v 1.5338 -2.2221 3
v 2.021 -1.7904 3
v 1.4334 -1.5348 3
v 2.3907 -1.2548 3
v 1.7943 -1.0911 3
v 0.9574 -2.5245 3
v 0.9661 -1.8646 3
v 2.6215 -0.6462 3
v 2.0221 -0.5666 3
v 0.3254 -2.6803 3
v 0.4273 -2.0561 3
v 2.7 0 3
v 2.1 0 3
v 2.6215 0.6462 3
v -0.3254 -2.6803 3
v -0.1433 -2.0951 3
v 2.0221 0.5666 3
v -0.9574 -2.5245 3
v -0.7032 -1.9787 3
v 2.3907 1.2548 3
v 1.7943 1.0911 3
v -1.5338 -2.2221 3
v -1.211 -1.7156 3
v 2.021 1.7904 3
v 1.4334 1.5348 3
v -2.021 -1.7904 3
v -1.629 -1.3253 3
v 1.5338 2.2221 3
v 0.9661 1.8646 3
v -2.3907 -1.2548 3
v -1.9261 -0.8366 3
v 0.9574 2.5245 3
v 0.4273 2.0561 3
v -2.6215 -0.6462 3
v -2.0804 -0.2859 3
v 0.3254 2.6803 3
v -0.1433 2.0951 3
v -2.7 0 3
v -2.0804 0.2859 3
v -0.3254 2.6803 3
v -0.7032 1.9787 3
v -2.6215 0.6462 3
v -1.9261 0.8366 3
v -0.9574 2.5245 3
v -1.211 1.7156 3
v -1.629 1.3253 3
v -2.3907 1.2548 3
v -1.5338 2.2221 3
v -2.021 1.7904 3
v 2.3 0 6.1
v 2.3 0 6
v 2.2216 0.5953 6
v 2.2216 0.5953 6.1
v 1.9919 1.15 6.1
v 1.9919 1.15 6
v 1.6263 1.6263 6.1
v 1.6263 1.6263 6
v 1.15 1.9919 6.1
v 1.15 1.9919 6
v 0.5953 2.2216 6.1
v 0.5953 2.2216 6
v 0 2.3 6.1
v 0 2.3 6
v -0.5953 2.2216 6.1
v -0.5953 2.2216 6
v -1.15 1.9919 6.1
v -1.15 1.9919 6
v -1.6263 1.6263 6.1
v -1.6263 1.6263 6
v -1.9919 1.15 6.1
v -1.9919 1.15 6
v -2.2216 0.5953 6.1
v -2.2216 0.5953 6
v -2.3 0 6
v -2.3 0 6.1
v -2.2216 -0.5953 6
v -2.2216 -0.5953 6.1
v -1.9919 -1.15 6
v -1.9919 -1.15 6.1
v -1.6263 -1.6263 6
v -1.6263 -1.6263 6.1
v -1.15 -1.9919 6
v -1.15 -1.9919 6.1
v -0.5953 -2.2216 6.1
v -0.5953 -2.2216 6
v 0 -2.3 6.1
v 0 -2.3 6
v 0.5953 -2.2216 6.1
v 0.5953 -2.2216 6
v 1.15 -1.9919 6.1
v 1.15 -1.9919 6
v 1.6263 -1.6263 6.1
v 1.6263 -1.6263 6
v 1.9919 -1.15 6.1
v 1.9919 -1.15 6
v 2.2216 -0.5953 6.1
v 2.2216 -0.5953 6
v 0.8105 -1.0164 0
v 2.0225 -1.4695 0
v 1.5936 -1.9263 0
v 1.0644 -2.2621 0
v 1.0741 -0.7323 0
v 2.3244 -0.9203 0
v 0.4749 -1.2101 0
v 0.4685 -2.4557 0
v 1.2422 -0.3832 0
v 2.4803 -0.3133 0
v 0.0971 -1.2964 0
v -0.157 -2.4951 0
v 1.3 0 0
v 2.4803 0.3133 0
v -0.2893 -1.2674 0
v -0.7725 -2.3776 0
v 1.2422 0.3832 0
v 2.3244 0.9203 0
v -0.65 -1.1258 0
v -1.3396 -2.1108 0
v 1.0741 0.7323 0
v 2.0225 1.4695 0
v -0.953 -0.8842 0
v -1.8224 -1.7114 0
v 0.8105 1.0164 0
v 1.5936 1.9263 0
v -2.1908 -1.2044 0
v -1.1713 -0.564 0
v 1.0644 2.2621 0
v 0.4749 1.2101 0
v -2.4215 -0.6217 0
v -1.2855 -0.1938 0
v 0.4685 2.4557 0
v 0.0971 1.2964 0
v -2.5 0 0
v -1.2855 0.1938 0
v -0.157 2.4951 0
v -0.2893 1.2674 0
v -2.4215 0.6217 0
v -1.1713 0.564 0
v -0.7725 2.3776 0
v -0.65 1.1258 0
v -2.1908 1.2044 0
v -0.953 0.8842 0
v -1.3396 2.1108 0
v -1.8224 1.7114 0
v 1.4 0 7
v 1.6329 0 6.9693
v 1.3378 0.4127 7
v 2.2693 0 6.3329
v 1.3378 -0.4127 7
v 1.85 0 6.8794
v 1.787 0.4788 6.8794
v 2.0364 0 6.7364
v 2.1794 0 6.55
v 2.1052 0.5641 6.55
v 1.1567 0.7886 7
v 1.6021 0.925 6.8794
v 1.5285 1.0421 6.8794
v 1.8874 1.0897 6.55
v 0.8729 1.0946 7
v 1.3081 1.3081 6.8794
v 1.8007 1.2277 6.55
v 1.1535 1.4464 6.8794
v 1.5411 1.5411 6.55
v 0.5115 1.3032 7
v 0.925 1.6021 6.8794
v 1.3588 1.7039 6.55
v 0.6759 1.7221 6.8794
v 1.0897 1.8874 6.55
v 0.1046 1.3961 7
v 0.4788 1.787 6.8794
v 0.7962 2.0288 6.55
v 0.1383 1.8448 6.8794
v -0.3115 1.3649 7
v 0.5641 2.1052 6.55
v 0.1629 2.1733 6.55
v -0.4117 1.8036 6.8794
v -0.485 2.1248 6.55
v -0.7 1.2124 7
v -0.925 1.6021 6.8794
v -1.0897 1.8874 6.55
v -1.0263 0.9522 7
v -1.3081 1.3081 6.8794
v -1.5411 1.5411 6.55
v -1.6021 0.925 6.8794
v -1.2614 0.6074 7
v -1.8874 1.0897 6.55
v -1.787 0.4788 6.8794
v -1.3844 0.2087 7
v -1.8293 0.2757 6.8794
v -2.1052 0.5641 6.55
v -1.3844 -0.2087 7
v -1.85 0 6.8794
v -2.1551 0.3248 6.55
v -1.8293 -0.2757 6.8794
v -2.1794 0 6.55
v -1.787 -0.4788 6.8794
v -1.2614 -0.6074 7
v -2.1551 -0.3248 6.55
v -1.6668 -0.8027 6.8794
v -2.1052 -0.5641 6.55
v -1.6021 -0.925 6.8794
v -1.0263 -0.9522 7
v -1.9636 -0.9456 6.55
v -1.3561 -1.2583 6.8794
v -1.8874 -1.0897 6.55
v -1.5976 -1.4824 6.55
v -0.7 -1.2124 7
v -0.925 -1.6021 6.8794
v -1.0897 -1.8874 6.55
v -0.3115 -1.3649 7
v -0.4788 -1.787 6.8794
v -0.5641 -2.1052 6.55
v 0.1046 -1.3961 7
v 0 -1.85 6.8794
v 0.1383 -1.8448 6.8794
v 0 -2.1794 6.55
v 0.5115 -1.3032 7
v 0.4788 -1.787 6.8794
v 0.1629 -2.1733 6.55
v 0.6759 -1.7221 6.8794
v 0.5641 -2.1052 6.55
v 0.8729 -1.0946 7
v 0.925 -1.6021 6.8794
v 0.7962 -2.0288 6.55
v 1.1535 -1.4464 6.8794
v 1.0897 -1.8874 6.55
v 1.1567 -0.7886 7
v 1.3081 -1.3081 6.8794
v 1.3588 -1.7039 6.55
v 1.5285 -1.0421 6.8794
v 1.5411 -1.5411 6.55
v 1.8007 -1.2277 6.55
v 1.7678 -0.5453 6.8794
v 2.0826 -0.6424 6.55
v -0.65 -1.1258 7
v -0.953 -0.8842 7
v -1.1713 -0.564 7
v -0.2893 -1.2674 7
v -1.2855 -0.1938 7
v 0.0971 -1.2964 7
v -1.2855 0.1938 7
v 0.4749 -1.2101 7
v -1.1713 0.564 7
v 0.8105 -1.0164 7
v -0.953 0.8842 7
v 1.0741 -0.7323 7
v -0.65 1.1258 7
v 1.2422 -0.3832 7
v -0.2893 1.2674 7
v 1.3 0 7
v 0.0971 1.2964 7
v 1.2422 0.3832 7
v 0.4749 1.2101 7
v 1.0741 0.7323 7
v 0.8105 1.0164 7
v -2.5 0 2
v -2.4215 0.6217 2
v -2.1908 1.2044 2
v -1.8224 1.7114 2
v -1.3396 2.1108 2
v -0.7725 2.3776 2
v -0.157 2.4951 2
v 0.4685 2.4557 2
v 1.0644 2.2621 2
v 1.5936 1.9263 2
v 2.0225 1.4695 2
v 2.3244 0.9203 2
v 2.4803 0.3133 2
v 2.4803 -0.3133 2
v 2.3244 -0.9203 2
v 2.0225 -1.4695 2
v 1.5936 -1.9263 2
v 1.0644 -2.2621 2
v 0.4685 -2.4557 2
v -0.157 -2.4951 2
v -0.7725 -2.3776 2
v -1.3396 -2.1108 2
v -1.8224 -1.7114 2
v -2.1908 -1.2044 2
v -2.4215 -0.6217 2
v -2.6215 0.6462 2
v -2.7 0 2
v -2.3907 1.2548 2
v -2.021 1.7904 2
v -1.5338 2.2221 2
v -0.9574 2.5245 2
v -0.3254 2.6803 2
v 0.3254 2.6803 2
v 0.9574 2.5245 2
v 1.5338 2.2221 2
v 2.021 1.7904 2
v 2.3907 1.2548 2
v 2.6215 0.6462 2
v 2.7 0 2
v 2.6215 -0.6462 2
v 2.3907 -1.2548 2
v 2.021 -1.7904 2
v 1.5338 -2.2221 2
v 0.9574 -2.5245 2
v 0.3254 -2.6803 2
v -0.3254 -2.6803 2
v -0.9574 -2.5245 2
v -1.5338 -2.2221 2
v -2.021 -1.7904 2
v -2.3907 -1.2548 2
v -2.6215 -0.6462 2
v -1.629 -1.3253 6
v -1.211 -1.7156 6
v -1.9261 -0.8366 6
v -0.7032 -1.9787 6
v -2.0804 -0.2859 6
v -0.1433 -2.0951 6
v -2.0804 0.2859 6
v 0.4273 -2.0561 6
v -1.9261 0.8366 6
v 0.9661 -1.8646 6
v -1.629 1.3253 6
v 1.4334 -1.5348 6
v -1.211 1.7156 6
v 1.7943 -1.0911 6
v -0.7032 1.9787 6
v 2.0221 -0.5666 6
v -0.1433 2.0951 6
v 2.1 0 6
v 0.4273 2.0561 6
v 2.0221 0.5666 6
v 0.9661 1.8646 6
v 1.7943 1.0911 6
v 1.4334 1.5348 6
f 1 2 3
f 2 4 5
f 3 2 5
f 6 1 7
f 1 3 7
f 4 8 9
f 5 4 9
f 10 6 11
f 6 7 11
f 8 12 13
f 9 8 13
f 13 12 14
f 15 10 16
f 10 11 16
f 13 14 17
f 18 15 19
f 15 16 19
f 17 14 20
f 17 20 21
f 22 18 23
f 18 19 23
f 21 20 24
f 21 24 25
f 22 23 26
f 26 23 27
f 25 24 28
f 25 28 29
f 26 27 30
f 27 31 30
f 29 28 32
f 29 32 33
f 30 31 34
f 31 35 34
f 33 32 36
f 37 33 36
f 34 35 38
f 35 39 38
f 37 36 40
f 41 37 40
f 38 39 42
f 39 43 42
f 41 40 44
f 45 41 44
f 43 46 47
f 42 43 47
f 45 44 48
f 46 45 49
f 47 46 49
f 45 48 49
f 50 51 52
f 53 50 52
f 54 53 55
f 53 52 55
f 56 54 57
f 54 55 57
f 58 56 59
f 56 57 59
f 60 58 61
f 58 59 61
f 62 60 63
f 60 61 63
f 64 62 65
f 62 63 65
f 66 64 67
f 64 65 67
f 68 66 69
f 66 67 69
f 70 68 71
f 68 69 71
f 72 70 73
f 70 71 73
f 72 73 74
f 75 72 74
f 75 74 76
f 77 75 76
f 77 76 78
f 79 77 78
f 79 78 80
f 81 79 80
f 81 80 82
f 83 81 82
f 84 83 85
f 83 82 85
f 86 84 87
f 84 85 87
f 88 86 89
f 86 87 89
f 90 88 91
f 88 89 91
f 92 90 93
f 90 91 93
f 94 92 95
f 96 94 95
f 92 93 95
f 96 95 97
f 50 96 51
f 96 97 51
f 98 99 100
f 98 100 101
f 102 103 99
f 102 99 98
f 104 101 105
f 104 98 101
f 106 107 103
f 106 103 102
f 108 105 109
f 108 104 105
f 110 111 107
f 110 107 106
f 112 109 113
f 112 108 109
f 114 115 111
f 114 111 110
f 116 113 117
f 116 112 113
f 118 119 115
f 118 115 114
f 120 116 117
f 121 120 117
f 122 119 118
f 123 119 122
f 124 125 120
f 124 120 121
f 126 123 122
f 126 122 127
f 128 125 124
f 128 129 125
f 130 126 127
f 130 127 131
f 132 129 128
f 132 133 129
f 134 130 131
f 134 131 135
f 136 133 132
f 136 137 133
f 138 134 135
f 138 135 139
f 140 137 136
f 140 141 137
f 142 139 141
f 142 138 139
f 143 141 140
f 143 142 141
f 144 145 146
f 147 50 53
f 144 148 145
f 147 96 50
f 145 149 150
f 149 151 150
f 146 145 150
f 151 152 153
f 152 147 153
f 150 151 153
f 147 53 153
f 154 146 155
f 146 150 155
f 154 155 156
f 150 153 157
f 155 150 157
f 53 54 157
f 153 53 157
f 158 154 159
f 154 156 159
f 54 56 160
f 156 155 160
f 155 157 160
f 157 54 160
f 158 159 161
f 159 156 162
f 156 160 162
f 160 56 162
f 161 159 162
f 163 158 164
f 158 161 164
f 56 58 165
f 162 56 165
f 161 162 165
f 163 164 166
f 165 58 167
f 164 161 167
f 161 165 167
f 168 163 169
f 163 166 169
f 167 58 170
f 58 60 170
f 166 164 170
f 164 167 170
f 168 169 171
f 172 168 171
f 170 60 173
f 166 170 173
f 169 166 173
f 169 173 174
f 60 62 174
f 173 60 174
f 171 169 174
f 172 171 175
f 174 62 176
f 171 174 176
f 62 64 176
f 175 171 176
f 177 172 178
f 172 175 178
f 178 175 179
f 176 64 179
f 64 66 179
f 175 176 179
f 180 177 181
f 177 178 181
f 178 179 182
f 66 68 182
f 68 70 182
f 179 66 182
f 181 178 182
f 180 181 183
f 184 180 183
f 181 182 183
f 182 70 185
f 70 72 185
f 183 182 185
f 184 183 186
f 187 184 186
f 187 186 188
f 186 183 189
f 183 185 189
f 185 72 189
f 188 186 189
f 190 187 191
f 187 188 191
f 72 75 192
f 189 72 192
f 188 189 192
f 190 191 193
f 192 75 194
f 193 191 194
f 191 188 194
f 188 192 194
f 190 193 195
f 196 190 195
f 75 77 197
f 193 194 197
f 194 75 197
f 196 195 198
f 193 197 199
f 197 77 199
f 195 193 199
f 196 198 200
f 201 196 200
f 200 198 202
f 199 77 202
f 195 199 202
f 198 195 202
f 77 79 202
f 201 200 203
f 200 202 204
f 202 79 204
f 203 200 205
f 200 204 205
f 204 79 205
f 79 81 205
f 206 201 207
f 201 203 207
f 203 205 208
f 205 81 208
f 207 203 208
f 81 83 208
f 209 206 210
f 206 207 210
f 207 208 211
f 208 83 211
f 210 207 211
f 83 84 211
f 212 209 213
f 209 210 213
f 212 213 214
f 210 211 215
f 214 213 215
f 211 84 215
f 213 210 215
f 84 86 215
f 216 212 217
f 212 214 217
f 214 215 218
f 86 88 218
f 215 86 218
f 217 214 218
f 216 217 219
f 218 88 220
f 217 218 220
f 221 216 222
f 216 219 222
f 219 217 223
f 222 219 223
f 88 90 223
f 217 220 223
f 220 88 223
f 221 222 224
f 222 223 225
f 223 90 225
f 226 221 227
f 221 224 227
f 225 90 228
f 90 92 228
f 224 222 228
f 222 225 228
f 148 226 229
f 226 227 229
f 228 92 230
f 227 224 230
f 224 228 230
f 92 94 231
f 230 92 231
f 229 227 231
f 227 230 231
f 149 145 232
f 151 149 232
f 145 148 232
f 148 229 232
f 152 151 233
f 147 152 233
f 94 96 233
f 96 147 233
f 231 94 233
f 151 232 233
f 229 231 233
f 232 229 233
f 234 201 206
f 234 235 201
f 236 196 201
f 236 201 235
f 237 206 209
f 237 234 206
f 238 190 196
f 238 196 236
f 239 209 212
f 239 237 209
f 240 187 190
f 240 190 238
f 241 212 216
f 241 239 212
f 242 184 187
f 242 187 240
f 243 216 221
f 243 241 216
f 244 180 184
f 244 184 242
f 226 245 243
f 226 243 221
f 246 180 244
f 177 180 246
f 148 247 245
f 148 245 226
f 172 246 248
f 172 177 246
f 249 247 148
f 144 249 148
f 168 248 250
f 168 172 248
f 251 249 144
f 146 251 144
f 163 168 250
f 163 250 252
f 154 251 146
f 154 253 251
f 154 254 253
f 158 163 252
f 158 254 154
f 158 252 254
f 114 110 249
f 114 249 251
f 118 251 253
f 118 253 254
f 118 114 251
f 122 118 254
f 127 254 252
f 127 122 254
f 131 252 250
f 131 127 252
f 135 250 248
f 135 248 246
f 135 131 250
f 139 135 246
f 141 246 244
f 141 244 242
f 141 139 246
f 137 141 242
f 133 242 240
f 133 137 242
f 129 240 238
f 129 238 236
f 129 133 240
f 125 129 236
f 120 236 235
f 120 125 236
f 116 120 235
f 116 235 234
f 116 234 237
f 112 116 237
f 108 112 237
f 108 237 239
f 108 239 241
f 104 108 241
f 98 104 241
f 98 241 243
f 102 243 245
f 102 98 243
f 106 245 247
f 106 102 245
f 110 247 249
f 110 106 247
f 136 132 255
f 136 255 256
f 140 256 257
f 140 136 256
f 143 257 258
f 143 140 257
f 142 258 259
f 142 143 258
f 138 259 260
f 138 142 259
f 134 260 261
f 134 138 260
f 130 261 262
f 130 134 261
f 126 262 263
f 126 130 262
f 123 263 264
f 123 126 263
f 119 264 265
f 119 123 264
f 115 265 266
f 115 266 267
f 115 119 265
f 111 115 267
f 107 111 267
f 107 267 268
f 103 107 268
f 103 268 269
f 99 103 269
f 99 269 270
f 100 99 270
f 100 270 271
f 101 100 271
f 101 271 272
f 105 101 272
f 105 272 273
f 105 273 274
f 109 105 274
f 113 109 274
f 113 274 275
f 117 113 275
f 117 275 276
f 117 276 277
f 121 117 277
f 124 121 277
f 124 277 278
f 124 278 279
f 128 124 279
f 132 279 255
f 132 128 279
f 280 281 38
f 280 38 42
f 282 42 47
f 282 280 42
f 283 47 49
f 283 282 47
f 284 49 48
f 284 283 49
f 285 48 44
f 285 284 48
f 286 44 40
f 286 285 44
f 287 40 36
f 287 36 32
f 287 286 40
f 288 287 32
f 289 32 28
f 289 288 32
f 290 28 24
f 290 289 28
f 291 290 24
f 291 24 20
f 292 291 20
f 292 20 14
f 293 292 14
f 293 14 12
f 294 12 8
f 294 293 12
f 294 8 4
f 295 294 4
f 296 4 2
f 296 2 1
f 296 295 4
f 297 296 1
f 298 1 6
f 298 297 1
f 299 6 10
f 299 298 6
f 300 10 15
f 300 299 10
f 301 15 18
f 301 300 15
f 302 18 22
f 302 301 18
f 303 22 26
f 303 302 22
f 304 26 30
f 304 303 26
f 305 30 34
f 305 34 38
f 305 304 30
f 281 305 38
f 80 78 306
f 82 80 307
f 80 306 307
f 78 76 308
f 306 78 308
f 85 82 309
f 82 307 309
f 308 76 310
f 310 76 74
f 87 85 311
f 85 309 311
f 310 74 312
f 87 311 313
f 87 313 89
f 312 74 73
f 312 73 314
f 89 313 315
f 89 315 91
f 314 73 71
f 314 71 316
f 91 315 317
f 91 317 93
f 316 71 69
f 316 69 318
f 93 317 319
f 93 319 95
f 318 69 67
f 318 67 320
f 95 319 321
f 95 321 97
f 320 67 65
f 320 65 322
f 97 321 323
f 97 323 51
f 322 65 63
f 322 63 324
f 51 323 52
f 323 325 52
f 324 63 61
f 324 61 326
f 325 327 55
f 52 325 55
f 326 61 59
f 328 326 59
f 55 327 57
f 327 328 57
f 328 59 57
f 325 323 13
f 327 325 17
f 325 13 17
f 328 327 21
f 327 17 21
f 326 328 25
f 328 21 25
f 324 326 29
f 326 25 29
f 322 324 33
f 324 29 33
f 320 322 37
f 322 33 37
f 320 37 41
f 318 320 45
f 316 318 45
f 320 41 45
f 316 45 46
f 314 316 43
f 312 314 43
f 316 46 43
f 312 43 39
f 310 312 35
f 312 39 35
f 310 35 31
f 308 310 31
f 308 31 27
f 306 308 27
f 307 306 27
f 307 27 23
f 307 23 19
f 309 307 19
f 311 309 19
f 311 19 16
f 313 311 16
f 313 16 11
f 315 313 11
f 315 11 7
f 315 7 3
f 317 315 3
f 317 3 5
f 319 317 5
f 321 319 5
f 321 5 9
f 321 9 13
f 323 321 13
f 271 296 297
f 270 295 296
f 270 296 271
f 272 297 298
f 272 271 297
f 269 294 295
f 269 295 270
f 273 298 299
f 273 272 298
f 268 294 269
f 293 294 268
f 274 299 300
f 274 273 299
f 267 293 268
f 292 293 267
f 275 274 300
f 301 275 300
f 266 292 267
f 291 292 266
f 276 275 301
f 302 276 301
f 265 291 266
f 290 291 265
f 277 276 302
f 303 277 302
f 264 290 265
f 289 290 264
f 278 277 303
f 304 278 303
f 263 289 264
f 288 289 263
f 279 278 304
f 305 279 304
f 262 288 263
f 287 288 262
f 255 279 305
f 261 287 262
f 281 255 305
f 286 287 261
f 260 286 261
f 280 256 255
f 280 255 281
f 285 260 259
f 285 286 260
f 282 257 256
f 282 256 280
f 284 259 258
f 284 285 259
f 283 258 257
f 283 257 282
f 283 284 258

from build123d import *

# Parameters (mm, degrees)
SKETCH1_R           = 2.1
SKETCH1_R_2         = 1.3
BOSS_EXTRUDE1_DEPTH = 7
SKETCH2_R           = 2.5
SKETCH2_R_2         = 2.1
BOSS_EXTRUDE2_DEPTH = 3
BOSS_EXTRUDE3_START = -1
SKETCH3_R           = 2.3
SKETCH3_R_2         = 2.1
BOSS_EXTRUDE3_DEPTH = 1
BOSS_EXTRUDE4_START = -2
SKETCH4_R           = 2.7
SKETCH4_R_2         = 2.5
BOSS_EXTRUDE4_DEPTH = 1
FILLET1_R           = 0.9


with BuildPart() as part:
    # Sketch1 → Boss-Extrude1 (new body)
    with BuildSketch(Plane.XY):
        Circle(SKETCH1_R)
        Circle(SKETCH1_R_2, mode=Mode.SUBTRACT)
    extrude(amount=BOSS_EXTRUDE1_DEPTH)

    # Sketch2 → Boss-Extrude2 (add)
    with BuildSketch(Plane(origin=(0, 0, 0), x_dir=(-1, 0, 0), z_dir=(0, 0, -1))):
        Circle(SKETCH2_R)
        Circle(SKETCH2_R_2, mode=Mode.SUBTRACT)
    extrude(amount=-BOSS_EXTRUDE2_DEPTH)

    # Sketch3 → Boss-Extrude3 (add)
    with BuildSketch(Plane.XY.offset(7).offset(BOSS_EXTRUDE3_START)):
        Circle(SKETCH3_R)
        with Locations(Location((0, 0, 0), (0, 0, 180))):
            Circle(SKETCH3_R_2, mode=Mode.SUBTRACT)
    extrude(amount=BOSS_EXTRUDE3_DEPTH)

    # Sketch4 → Boss-Extrude4 (add)
    with BuildSketch(Plane(origin=(0, 0, 0), x_dir=(-1, 0, 0), z_dir=(0, 0, -1)).offset(BOSS_EXTRUDE4_START)):
        Circle(SKETCH4_R)
        Circle(SKETCH4_R_2, mode=Mode.SUBTRACT)
    extrude(amount=-BOSS_EXTRUDE4_DEPTH)

    # Fillet1
    fillet1_edges = [part.edges().sort_by_distance(p)[0] for p in [
        (-2.3, 0, 7),
    ]]
    fillet(fillet1_edges, radius=FILLET1_R)


solid = part.part
